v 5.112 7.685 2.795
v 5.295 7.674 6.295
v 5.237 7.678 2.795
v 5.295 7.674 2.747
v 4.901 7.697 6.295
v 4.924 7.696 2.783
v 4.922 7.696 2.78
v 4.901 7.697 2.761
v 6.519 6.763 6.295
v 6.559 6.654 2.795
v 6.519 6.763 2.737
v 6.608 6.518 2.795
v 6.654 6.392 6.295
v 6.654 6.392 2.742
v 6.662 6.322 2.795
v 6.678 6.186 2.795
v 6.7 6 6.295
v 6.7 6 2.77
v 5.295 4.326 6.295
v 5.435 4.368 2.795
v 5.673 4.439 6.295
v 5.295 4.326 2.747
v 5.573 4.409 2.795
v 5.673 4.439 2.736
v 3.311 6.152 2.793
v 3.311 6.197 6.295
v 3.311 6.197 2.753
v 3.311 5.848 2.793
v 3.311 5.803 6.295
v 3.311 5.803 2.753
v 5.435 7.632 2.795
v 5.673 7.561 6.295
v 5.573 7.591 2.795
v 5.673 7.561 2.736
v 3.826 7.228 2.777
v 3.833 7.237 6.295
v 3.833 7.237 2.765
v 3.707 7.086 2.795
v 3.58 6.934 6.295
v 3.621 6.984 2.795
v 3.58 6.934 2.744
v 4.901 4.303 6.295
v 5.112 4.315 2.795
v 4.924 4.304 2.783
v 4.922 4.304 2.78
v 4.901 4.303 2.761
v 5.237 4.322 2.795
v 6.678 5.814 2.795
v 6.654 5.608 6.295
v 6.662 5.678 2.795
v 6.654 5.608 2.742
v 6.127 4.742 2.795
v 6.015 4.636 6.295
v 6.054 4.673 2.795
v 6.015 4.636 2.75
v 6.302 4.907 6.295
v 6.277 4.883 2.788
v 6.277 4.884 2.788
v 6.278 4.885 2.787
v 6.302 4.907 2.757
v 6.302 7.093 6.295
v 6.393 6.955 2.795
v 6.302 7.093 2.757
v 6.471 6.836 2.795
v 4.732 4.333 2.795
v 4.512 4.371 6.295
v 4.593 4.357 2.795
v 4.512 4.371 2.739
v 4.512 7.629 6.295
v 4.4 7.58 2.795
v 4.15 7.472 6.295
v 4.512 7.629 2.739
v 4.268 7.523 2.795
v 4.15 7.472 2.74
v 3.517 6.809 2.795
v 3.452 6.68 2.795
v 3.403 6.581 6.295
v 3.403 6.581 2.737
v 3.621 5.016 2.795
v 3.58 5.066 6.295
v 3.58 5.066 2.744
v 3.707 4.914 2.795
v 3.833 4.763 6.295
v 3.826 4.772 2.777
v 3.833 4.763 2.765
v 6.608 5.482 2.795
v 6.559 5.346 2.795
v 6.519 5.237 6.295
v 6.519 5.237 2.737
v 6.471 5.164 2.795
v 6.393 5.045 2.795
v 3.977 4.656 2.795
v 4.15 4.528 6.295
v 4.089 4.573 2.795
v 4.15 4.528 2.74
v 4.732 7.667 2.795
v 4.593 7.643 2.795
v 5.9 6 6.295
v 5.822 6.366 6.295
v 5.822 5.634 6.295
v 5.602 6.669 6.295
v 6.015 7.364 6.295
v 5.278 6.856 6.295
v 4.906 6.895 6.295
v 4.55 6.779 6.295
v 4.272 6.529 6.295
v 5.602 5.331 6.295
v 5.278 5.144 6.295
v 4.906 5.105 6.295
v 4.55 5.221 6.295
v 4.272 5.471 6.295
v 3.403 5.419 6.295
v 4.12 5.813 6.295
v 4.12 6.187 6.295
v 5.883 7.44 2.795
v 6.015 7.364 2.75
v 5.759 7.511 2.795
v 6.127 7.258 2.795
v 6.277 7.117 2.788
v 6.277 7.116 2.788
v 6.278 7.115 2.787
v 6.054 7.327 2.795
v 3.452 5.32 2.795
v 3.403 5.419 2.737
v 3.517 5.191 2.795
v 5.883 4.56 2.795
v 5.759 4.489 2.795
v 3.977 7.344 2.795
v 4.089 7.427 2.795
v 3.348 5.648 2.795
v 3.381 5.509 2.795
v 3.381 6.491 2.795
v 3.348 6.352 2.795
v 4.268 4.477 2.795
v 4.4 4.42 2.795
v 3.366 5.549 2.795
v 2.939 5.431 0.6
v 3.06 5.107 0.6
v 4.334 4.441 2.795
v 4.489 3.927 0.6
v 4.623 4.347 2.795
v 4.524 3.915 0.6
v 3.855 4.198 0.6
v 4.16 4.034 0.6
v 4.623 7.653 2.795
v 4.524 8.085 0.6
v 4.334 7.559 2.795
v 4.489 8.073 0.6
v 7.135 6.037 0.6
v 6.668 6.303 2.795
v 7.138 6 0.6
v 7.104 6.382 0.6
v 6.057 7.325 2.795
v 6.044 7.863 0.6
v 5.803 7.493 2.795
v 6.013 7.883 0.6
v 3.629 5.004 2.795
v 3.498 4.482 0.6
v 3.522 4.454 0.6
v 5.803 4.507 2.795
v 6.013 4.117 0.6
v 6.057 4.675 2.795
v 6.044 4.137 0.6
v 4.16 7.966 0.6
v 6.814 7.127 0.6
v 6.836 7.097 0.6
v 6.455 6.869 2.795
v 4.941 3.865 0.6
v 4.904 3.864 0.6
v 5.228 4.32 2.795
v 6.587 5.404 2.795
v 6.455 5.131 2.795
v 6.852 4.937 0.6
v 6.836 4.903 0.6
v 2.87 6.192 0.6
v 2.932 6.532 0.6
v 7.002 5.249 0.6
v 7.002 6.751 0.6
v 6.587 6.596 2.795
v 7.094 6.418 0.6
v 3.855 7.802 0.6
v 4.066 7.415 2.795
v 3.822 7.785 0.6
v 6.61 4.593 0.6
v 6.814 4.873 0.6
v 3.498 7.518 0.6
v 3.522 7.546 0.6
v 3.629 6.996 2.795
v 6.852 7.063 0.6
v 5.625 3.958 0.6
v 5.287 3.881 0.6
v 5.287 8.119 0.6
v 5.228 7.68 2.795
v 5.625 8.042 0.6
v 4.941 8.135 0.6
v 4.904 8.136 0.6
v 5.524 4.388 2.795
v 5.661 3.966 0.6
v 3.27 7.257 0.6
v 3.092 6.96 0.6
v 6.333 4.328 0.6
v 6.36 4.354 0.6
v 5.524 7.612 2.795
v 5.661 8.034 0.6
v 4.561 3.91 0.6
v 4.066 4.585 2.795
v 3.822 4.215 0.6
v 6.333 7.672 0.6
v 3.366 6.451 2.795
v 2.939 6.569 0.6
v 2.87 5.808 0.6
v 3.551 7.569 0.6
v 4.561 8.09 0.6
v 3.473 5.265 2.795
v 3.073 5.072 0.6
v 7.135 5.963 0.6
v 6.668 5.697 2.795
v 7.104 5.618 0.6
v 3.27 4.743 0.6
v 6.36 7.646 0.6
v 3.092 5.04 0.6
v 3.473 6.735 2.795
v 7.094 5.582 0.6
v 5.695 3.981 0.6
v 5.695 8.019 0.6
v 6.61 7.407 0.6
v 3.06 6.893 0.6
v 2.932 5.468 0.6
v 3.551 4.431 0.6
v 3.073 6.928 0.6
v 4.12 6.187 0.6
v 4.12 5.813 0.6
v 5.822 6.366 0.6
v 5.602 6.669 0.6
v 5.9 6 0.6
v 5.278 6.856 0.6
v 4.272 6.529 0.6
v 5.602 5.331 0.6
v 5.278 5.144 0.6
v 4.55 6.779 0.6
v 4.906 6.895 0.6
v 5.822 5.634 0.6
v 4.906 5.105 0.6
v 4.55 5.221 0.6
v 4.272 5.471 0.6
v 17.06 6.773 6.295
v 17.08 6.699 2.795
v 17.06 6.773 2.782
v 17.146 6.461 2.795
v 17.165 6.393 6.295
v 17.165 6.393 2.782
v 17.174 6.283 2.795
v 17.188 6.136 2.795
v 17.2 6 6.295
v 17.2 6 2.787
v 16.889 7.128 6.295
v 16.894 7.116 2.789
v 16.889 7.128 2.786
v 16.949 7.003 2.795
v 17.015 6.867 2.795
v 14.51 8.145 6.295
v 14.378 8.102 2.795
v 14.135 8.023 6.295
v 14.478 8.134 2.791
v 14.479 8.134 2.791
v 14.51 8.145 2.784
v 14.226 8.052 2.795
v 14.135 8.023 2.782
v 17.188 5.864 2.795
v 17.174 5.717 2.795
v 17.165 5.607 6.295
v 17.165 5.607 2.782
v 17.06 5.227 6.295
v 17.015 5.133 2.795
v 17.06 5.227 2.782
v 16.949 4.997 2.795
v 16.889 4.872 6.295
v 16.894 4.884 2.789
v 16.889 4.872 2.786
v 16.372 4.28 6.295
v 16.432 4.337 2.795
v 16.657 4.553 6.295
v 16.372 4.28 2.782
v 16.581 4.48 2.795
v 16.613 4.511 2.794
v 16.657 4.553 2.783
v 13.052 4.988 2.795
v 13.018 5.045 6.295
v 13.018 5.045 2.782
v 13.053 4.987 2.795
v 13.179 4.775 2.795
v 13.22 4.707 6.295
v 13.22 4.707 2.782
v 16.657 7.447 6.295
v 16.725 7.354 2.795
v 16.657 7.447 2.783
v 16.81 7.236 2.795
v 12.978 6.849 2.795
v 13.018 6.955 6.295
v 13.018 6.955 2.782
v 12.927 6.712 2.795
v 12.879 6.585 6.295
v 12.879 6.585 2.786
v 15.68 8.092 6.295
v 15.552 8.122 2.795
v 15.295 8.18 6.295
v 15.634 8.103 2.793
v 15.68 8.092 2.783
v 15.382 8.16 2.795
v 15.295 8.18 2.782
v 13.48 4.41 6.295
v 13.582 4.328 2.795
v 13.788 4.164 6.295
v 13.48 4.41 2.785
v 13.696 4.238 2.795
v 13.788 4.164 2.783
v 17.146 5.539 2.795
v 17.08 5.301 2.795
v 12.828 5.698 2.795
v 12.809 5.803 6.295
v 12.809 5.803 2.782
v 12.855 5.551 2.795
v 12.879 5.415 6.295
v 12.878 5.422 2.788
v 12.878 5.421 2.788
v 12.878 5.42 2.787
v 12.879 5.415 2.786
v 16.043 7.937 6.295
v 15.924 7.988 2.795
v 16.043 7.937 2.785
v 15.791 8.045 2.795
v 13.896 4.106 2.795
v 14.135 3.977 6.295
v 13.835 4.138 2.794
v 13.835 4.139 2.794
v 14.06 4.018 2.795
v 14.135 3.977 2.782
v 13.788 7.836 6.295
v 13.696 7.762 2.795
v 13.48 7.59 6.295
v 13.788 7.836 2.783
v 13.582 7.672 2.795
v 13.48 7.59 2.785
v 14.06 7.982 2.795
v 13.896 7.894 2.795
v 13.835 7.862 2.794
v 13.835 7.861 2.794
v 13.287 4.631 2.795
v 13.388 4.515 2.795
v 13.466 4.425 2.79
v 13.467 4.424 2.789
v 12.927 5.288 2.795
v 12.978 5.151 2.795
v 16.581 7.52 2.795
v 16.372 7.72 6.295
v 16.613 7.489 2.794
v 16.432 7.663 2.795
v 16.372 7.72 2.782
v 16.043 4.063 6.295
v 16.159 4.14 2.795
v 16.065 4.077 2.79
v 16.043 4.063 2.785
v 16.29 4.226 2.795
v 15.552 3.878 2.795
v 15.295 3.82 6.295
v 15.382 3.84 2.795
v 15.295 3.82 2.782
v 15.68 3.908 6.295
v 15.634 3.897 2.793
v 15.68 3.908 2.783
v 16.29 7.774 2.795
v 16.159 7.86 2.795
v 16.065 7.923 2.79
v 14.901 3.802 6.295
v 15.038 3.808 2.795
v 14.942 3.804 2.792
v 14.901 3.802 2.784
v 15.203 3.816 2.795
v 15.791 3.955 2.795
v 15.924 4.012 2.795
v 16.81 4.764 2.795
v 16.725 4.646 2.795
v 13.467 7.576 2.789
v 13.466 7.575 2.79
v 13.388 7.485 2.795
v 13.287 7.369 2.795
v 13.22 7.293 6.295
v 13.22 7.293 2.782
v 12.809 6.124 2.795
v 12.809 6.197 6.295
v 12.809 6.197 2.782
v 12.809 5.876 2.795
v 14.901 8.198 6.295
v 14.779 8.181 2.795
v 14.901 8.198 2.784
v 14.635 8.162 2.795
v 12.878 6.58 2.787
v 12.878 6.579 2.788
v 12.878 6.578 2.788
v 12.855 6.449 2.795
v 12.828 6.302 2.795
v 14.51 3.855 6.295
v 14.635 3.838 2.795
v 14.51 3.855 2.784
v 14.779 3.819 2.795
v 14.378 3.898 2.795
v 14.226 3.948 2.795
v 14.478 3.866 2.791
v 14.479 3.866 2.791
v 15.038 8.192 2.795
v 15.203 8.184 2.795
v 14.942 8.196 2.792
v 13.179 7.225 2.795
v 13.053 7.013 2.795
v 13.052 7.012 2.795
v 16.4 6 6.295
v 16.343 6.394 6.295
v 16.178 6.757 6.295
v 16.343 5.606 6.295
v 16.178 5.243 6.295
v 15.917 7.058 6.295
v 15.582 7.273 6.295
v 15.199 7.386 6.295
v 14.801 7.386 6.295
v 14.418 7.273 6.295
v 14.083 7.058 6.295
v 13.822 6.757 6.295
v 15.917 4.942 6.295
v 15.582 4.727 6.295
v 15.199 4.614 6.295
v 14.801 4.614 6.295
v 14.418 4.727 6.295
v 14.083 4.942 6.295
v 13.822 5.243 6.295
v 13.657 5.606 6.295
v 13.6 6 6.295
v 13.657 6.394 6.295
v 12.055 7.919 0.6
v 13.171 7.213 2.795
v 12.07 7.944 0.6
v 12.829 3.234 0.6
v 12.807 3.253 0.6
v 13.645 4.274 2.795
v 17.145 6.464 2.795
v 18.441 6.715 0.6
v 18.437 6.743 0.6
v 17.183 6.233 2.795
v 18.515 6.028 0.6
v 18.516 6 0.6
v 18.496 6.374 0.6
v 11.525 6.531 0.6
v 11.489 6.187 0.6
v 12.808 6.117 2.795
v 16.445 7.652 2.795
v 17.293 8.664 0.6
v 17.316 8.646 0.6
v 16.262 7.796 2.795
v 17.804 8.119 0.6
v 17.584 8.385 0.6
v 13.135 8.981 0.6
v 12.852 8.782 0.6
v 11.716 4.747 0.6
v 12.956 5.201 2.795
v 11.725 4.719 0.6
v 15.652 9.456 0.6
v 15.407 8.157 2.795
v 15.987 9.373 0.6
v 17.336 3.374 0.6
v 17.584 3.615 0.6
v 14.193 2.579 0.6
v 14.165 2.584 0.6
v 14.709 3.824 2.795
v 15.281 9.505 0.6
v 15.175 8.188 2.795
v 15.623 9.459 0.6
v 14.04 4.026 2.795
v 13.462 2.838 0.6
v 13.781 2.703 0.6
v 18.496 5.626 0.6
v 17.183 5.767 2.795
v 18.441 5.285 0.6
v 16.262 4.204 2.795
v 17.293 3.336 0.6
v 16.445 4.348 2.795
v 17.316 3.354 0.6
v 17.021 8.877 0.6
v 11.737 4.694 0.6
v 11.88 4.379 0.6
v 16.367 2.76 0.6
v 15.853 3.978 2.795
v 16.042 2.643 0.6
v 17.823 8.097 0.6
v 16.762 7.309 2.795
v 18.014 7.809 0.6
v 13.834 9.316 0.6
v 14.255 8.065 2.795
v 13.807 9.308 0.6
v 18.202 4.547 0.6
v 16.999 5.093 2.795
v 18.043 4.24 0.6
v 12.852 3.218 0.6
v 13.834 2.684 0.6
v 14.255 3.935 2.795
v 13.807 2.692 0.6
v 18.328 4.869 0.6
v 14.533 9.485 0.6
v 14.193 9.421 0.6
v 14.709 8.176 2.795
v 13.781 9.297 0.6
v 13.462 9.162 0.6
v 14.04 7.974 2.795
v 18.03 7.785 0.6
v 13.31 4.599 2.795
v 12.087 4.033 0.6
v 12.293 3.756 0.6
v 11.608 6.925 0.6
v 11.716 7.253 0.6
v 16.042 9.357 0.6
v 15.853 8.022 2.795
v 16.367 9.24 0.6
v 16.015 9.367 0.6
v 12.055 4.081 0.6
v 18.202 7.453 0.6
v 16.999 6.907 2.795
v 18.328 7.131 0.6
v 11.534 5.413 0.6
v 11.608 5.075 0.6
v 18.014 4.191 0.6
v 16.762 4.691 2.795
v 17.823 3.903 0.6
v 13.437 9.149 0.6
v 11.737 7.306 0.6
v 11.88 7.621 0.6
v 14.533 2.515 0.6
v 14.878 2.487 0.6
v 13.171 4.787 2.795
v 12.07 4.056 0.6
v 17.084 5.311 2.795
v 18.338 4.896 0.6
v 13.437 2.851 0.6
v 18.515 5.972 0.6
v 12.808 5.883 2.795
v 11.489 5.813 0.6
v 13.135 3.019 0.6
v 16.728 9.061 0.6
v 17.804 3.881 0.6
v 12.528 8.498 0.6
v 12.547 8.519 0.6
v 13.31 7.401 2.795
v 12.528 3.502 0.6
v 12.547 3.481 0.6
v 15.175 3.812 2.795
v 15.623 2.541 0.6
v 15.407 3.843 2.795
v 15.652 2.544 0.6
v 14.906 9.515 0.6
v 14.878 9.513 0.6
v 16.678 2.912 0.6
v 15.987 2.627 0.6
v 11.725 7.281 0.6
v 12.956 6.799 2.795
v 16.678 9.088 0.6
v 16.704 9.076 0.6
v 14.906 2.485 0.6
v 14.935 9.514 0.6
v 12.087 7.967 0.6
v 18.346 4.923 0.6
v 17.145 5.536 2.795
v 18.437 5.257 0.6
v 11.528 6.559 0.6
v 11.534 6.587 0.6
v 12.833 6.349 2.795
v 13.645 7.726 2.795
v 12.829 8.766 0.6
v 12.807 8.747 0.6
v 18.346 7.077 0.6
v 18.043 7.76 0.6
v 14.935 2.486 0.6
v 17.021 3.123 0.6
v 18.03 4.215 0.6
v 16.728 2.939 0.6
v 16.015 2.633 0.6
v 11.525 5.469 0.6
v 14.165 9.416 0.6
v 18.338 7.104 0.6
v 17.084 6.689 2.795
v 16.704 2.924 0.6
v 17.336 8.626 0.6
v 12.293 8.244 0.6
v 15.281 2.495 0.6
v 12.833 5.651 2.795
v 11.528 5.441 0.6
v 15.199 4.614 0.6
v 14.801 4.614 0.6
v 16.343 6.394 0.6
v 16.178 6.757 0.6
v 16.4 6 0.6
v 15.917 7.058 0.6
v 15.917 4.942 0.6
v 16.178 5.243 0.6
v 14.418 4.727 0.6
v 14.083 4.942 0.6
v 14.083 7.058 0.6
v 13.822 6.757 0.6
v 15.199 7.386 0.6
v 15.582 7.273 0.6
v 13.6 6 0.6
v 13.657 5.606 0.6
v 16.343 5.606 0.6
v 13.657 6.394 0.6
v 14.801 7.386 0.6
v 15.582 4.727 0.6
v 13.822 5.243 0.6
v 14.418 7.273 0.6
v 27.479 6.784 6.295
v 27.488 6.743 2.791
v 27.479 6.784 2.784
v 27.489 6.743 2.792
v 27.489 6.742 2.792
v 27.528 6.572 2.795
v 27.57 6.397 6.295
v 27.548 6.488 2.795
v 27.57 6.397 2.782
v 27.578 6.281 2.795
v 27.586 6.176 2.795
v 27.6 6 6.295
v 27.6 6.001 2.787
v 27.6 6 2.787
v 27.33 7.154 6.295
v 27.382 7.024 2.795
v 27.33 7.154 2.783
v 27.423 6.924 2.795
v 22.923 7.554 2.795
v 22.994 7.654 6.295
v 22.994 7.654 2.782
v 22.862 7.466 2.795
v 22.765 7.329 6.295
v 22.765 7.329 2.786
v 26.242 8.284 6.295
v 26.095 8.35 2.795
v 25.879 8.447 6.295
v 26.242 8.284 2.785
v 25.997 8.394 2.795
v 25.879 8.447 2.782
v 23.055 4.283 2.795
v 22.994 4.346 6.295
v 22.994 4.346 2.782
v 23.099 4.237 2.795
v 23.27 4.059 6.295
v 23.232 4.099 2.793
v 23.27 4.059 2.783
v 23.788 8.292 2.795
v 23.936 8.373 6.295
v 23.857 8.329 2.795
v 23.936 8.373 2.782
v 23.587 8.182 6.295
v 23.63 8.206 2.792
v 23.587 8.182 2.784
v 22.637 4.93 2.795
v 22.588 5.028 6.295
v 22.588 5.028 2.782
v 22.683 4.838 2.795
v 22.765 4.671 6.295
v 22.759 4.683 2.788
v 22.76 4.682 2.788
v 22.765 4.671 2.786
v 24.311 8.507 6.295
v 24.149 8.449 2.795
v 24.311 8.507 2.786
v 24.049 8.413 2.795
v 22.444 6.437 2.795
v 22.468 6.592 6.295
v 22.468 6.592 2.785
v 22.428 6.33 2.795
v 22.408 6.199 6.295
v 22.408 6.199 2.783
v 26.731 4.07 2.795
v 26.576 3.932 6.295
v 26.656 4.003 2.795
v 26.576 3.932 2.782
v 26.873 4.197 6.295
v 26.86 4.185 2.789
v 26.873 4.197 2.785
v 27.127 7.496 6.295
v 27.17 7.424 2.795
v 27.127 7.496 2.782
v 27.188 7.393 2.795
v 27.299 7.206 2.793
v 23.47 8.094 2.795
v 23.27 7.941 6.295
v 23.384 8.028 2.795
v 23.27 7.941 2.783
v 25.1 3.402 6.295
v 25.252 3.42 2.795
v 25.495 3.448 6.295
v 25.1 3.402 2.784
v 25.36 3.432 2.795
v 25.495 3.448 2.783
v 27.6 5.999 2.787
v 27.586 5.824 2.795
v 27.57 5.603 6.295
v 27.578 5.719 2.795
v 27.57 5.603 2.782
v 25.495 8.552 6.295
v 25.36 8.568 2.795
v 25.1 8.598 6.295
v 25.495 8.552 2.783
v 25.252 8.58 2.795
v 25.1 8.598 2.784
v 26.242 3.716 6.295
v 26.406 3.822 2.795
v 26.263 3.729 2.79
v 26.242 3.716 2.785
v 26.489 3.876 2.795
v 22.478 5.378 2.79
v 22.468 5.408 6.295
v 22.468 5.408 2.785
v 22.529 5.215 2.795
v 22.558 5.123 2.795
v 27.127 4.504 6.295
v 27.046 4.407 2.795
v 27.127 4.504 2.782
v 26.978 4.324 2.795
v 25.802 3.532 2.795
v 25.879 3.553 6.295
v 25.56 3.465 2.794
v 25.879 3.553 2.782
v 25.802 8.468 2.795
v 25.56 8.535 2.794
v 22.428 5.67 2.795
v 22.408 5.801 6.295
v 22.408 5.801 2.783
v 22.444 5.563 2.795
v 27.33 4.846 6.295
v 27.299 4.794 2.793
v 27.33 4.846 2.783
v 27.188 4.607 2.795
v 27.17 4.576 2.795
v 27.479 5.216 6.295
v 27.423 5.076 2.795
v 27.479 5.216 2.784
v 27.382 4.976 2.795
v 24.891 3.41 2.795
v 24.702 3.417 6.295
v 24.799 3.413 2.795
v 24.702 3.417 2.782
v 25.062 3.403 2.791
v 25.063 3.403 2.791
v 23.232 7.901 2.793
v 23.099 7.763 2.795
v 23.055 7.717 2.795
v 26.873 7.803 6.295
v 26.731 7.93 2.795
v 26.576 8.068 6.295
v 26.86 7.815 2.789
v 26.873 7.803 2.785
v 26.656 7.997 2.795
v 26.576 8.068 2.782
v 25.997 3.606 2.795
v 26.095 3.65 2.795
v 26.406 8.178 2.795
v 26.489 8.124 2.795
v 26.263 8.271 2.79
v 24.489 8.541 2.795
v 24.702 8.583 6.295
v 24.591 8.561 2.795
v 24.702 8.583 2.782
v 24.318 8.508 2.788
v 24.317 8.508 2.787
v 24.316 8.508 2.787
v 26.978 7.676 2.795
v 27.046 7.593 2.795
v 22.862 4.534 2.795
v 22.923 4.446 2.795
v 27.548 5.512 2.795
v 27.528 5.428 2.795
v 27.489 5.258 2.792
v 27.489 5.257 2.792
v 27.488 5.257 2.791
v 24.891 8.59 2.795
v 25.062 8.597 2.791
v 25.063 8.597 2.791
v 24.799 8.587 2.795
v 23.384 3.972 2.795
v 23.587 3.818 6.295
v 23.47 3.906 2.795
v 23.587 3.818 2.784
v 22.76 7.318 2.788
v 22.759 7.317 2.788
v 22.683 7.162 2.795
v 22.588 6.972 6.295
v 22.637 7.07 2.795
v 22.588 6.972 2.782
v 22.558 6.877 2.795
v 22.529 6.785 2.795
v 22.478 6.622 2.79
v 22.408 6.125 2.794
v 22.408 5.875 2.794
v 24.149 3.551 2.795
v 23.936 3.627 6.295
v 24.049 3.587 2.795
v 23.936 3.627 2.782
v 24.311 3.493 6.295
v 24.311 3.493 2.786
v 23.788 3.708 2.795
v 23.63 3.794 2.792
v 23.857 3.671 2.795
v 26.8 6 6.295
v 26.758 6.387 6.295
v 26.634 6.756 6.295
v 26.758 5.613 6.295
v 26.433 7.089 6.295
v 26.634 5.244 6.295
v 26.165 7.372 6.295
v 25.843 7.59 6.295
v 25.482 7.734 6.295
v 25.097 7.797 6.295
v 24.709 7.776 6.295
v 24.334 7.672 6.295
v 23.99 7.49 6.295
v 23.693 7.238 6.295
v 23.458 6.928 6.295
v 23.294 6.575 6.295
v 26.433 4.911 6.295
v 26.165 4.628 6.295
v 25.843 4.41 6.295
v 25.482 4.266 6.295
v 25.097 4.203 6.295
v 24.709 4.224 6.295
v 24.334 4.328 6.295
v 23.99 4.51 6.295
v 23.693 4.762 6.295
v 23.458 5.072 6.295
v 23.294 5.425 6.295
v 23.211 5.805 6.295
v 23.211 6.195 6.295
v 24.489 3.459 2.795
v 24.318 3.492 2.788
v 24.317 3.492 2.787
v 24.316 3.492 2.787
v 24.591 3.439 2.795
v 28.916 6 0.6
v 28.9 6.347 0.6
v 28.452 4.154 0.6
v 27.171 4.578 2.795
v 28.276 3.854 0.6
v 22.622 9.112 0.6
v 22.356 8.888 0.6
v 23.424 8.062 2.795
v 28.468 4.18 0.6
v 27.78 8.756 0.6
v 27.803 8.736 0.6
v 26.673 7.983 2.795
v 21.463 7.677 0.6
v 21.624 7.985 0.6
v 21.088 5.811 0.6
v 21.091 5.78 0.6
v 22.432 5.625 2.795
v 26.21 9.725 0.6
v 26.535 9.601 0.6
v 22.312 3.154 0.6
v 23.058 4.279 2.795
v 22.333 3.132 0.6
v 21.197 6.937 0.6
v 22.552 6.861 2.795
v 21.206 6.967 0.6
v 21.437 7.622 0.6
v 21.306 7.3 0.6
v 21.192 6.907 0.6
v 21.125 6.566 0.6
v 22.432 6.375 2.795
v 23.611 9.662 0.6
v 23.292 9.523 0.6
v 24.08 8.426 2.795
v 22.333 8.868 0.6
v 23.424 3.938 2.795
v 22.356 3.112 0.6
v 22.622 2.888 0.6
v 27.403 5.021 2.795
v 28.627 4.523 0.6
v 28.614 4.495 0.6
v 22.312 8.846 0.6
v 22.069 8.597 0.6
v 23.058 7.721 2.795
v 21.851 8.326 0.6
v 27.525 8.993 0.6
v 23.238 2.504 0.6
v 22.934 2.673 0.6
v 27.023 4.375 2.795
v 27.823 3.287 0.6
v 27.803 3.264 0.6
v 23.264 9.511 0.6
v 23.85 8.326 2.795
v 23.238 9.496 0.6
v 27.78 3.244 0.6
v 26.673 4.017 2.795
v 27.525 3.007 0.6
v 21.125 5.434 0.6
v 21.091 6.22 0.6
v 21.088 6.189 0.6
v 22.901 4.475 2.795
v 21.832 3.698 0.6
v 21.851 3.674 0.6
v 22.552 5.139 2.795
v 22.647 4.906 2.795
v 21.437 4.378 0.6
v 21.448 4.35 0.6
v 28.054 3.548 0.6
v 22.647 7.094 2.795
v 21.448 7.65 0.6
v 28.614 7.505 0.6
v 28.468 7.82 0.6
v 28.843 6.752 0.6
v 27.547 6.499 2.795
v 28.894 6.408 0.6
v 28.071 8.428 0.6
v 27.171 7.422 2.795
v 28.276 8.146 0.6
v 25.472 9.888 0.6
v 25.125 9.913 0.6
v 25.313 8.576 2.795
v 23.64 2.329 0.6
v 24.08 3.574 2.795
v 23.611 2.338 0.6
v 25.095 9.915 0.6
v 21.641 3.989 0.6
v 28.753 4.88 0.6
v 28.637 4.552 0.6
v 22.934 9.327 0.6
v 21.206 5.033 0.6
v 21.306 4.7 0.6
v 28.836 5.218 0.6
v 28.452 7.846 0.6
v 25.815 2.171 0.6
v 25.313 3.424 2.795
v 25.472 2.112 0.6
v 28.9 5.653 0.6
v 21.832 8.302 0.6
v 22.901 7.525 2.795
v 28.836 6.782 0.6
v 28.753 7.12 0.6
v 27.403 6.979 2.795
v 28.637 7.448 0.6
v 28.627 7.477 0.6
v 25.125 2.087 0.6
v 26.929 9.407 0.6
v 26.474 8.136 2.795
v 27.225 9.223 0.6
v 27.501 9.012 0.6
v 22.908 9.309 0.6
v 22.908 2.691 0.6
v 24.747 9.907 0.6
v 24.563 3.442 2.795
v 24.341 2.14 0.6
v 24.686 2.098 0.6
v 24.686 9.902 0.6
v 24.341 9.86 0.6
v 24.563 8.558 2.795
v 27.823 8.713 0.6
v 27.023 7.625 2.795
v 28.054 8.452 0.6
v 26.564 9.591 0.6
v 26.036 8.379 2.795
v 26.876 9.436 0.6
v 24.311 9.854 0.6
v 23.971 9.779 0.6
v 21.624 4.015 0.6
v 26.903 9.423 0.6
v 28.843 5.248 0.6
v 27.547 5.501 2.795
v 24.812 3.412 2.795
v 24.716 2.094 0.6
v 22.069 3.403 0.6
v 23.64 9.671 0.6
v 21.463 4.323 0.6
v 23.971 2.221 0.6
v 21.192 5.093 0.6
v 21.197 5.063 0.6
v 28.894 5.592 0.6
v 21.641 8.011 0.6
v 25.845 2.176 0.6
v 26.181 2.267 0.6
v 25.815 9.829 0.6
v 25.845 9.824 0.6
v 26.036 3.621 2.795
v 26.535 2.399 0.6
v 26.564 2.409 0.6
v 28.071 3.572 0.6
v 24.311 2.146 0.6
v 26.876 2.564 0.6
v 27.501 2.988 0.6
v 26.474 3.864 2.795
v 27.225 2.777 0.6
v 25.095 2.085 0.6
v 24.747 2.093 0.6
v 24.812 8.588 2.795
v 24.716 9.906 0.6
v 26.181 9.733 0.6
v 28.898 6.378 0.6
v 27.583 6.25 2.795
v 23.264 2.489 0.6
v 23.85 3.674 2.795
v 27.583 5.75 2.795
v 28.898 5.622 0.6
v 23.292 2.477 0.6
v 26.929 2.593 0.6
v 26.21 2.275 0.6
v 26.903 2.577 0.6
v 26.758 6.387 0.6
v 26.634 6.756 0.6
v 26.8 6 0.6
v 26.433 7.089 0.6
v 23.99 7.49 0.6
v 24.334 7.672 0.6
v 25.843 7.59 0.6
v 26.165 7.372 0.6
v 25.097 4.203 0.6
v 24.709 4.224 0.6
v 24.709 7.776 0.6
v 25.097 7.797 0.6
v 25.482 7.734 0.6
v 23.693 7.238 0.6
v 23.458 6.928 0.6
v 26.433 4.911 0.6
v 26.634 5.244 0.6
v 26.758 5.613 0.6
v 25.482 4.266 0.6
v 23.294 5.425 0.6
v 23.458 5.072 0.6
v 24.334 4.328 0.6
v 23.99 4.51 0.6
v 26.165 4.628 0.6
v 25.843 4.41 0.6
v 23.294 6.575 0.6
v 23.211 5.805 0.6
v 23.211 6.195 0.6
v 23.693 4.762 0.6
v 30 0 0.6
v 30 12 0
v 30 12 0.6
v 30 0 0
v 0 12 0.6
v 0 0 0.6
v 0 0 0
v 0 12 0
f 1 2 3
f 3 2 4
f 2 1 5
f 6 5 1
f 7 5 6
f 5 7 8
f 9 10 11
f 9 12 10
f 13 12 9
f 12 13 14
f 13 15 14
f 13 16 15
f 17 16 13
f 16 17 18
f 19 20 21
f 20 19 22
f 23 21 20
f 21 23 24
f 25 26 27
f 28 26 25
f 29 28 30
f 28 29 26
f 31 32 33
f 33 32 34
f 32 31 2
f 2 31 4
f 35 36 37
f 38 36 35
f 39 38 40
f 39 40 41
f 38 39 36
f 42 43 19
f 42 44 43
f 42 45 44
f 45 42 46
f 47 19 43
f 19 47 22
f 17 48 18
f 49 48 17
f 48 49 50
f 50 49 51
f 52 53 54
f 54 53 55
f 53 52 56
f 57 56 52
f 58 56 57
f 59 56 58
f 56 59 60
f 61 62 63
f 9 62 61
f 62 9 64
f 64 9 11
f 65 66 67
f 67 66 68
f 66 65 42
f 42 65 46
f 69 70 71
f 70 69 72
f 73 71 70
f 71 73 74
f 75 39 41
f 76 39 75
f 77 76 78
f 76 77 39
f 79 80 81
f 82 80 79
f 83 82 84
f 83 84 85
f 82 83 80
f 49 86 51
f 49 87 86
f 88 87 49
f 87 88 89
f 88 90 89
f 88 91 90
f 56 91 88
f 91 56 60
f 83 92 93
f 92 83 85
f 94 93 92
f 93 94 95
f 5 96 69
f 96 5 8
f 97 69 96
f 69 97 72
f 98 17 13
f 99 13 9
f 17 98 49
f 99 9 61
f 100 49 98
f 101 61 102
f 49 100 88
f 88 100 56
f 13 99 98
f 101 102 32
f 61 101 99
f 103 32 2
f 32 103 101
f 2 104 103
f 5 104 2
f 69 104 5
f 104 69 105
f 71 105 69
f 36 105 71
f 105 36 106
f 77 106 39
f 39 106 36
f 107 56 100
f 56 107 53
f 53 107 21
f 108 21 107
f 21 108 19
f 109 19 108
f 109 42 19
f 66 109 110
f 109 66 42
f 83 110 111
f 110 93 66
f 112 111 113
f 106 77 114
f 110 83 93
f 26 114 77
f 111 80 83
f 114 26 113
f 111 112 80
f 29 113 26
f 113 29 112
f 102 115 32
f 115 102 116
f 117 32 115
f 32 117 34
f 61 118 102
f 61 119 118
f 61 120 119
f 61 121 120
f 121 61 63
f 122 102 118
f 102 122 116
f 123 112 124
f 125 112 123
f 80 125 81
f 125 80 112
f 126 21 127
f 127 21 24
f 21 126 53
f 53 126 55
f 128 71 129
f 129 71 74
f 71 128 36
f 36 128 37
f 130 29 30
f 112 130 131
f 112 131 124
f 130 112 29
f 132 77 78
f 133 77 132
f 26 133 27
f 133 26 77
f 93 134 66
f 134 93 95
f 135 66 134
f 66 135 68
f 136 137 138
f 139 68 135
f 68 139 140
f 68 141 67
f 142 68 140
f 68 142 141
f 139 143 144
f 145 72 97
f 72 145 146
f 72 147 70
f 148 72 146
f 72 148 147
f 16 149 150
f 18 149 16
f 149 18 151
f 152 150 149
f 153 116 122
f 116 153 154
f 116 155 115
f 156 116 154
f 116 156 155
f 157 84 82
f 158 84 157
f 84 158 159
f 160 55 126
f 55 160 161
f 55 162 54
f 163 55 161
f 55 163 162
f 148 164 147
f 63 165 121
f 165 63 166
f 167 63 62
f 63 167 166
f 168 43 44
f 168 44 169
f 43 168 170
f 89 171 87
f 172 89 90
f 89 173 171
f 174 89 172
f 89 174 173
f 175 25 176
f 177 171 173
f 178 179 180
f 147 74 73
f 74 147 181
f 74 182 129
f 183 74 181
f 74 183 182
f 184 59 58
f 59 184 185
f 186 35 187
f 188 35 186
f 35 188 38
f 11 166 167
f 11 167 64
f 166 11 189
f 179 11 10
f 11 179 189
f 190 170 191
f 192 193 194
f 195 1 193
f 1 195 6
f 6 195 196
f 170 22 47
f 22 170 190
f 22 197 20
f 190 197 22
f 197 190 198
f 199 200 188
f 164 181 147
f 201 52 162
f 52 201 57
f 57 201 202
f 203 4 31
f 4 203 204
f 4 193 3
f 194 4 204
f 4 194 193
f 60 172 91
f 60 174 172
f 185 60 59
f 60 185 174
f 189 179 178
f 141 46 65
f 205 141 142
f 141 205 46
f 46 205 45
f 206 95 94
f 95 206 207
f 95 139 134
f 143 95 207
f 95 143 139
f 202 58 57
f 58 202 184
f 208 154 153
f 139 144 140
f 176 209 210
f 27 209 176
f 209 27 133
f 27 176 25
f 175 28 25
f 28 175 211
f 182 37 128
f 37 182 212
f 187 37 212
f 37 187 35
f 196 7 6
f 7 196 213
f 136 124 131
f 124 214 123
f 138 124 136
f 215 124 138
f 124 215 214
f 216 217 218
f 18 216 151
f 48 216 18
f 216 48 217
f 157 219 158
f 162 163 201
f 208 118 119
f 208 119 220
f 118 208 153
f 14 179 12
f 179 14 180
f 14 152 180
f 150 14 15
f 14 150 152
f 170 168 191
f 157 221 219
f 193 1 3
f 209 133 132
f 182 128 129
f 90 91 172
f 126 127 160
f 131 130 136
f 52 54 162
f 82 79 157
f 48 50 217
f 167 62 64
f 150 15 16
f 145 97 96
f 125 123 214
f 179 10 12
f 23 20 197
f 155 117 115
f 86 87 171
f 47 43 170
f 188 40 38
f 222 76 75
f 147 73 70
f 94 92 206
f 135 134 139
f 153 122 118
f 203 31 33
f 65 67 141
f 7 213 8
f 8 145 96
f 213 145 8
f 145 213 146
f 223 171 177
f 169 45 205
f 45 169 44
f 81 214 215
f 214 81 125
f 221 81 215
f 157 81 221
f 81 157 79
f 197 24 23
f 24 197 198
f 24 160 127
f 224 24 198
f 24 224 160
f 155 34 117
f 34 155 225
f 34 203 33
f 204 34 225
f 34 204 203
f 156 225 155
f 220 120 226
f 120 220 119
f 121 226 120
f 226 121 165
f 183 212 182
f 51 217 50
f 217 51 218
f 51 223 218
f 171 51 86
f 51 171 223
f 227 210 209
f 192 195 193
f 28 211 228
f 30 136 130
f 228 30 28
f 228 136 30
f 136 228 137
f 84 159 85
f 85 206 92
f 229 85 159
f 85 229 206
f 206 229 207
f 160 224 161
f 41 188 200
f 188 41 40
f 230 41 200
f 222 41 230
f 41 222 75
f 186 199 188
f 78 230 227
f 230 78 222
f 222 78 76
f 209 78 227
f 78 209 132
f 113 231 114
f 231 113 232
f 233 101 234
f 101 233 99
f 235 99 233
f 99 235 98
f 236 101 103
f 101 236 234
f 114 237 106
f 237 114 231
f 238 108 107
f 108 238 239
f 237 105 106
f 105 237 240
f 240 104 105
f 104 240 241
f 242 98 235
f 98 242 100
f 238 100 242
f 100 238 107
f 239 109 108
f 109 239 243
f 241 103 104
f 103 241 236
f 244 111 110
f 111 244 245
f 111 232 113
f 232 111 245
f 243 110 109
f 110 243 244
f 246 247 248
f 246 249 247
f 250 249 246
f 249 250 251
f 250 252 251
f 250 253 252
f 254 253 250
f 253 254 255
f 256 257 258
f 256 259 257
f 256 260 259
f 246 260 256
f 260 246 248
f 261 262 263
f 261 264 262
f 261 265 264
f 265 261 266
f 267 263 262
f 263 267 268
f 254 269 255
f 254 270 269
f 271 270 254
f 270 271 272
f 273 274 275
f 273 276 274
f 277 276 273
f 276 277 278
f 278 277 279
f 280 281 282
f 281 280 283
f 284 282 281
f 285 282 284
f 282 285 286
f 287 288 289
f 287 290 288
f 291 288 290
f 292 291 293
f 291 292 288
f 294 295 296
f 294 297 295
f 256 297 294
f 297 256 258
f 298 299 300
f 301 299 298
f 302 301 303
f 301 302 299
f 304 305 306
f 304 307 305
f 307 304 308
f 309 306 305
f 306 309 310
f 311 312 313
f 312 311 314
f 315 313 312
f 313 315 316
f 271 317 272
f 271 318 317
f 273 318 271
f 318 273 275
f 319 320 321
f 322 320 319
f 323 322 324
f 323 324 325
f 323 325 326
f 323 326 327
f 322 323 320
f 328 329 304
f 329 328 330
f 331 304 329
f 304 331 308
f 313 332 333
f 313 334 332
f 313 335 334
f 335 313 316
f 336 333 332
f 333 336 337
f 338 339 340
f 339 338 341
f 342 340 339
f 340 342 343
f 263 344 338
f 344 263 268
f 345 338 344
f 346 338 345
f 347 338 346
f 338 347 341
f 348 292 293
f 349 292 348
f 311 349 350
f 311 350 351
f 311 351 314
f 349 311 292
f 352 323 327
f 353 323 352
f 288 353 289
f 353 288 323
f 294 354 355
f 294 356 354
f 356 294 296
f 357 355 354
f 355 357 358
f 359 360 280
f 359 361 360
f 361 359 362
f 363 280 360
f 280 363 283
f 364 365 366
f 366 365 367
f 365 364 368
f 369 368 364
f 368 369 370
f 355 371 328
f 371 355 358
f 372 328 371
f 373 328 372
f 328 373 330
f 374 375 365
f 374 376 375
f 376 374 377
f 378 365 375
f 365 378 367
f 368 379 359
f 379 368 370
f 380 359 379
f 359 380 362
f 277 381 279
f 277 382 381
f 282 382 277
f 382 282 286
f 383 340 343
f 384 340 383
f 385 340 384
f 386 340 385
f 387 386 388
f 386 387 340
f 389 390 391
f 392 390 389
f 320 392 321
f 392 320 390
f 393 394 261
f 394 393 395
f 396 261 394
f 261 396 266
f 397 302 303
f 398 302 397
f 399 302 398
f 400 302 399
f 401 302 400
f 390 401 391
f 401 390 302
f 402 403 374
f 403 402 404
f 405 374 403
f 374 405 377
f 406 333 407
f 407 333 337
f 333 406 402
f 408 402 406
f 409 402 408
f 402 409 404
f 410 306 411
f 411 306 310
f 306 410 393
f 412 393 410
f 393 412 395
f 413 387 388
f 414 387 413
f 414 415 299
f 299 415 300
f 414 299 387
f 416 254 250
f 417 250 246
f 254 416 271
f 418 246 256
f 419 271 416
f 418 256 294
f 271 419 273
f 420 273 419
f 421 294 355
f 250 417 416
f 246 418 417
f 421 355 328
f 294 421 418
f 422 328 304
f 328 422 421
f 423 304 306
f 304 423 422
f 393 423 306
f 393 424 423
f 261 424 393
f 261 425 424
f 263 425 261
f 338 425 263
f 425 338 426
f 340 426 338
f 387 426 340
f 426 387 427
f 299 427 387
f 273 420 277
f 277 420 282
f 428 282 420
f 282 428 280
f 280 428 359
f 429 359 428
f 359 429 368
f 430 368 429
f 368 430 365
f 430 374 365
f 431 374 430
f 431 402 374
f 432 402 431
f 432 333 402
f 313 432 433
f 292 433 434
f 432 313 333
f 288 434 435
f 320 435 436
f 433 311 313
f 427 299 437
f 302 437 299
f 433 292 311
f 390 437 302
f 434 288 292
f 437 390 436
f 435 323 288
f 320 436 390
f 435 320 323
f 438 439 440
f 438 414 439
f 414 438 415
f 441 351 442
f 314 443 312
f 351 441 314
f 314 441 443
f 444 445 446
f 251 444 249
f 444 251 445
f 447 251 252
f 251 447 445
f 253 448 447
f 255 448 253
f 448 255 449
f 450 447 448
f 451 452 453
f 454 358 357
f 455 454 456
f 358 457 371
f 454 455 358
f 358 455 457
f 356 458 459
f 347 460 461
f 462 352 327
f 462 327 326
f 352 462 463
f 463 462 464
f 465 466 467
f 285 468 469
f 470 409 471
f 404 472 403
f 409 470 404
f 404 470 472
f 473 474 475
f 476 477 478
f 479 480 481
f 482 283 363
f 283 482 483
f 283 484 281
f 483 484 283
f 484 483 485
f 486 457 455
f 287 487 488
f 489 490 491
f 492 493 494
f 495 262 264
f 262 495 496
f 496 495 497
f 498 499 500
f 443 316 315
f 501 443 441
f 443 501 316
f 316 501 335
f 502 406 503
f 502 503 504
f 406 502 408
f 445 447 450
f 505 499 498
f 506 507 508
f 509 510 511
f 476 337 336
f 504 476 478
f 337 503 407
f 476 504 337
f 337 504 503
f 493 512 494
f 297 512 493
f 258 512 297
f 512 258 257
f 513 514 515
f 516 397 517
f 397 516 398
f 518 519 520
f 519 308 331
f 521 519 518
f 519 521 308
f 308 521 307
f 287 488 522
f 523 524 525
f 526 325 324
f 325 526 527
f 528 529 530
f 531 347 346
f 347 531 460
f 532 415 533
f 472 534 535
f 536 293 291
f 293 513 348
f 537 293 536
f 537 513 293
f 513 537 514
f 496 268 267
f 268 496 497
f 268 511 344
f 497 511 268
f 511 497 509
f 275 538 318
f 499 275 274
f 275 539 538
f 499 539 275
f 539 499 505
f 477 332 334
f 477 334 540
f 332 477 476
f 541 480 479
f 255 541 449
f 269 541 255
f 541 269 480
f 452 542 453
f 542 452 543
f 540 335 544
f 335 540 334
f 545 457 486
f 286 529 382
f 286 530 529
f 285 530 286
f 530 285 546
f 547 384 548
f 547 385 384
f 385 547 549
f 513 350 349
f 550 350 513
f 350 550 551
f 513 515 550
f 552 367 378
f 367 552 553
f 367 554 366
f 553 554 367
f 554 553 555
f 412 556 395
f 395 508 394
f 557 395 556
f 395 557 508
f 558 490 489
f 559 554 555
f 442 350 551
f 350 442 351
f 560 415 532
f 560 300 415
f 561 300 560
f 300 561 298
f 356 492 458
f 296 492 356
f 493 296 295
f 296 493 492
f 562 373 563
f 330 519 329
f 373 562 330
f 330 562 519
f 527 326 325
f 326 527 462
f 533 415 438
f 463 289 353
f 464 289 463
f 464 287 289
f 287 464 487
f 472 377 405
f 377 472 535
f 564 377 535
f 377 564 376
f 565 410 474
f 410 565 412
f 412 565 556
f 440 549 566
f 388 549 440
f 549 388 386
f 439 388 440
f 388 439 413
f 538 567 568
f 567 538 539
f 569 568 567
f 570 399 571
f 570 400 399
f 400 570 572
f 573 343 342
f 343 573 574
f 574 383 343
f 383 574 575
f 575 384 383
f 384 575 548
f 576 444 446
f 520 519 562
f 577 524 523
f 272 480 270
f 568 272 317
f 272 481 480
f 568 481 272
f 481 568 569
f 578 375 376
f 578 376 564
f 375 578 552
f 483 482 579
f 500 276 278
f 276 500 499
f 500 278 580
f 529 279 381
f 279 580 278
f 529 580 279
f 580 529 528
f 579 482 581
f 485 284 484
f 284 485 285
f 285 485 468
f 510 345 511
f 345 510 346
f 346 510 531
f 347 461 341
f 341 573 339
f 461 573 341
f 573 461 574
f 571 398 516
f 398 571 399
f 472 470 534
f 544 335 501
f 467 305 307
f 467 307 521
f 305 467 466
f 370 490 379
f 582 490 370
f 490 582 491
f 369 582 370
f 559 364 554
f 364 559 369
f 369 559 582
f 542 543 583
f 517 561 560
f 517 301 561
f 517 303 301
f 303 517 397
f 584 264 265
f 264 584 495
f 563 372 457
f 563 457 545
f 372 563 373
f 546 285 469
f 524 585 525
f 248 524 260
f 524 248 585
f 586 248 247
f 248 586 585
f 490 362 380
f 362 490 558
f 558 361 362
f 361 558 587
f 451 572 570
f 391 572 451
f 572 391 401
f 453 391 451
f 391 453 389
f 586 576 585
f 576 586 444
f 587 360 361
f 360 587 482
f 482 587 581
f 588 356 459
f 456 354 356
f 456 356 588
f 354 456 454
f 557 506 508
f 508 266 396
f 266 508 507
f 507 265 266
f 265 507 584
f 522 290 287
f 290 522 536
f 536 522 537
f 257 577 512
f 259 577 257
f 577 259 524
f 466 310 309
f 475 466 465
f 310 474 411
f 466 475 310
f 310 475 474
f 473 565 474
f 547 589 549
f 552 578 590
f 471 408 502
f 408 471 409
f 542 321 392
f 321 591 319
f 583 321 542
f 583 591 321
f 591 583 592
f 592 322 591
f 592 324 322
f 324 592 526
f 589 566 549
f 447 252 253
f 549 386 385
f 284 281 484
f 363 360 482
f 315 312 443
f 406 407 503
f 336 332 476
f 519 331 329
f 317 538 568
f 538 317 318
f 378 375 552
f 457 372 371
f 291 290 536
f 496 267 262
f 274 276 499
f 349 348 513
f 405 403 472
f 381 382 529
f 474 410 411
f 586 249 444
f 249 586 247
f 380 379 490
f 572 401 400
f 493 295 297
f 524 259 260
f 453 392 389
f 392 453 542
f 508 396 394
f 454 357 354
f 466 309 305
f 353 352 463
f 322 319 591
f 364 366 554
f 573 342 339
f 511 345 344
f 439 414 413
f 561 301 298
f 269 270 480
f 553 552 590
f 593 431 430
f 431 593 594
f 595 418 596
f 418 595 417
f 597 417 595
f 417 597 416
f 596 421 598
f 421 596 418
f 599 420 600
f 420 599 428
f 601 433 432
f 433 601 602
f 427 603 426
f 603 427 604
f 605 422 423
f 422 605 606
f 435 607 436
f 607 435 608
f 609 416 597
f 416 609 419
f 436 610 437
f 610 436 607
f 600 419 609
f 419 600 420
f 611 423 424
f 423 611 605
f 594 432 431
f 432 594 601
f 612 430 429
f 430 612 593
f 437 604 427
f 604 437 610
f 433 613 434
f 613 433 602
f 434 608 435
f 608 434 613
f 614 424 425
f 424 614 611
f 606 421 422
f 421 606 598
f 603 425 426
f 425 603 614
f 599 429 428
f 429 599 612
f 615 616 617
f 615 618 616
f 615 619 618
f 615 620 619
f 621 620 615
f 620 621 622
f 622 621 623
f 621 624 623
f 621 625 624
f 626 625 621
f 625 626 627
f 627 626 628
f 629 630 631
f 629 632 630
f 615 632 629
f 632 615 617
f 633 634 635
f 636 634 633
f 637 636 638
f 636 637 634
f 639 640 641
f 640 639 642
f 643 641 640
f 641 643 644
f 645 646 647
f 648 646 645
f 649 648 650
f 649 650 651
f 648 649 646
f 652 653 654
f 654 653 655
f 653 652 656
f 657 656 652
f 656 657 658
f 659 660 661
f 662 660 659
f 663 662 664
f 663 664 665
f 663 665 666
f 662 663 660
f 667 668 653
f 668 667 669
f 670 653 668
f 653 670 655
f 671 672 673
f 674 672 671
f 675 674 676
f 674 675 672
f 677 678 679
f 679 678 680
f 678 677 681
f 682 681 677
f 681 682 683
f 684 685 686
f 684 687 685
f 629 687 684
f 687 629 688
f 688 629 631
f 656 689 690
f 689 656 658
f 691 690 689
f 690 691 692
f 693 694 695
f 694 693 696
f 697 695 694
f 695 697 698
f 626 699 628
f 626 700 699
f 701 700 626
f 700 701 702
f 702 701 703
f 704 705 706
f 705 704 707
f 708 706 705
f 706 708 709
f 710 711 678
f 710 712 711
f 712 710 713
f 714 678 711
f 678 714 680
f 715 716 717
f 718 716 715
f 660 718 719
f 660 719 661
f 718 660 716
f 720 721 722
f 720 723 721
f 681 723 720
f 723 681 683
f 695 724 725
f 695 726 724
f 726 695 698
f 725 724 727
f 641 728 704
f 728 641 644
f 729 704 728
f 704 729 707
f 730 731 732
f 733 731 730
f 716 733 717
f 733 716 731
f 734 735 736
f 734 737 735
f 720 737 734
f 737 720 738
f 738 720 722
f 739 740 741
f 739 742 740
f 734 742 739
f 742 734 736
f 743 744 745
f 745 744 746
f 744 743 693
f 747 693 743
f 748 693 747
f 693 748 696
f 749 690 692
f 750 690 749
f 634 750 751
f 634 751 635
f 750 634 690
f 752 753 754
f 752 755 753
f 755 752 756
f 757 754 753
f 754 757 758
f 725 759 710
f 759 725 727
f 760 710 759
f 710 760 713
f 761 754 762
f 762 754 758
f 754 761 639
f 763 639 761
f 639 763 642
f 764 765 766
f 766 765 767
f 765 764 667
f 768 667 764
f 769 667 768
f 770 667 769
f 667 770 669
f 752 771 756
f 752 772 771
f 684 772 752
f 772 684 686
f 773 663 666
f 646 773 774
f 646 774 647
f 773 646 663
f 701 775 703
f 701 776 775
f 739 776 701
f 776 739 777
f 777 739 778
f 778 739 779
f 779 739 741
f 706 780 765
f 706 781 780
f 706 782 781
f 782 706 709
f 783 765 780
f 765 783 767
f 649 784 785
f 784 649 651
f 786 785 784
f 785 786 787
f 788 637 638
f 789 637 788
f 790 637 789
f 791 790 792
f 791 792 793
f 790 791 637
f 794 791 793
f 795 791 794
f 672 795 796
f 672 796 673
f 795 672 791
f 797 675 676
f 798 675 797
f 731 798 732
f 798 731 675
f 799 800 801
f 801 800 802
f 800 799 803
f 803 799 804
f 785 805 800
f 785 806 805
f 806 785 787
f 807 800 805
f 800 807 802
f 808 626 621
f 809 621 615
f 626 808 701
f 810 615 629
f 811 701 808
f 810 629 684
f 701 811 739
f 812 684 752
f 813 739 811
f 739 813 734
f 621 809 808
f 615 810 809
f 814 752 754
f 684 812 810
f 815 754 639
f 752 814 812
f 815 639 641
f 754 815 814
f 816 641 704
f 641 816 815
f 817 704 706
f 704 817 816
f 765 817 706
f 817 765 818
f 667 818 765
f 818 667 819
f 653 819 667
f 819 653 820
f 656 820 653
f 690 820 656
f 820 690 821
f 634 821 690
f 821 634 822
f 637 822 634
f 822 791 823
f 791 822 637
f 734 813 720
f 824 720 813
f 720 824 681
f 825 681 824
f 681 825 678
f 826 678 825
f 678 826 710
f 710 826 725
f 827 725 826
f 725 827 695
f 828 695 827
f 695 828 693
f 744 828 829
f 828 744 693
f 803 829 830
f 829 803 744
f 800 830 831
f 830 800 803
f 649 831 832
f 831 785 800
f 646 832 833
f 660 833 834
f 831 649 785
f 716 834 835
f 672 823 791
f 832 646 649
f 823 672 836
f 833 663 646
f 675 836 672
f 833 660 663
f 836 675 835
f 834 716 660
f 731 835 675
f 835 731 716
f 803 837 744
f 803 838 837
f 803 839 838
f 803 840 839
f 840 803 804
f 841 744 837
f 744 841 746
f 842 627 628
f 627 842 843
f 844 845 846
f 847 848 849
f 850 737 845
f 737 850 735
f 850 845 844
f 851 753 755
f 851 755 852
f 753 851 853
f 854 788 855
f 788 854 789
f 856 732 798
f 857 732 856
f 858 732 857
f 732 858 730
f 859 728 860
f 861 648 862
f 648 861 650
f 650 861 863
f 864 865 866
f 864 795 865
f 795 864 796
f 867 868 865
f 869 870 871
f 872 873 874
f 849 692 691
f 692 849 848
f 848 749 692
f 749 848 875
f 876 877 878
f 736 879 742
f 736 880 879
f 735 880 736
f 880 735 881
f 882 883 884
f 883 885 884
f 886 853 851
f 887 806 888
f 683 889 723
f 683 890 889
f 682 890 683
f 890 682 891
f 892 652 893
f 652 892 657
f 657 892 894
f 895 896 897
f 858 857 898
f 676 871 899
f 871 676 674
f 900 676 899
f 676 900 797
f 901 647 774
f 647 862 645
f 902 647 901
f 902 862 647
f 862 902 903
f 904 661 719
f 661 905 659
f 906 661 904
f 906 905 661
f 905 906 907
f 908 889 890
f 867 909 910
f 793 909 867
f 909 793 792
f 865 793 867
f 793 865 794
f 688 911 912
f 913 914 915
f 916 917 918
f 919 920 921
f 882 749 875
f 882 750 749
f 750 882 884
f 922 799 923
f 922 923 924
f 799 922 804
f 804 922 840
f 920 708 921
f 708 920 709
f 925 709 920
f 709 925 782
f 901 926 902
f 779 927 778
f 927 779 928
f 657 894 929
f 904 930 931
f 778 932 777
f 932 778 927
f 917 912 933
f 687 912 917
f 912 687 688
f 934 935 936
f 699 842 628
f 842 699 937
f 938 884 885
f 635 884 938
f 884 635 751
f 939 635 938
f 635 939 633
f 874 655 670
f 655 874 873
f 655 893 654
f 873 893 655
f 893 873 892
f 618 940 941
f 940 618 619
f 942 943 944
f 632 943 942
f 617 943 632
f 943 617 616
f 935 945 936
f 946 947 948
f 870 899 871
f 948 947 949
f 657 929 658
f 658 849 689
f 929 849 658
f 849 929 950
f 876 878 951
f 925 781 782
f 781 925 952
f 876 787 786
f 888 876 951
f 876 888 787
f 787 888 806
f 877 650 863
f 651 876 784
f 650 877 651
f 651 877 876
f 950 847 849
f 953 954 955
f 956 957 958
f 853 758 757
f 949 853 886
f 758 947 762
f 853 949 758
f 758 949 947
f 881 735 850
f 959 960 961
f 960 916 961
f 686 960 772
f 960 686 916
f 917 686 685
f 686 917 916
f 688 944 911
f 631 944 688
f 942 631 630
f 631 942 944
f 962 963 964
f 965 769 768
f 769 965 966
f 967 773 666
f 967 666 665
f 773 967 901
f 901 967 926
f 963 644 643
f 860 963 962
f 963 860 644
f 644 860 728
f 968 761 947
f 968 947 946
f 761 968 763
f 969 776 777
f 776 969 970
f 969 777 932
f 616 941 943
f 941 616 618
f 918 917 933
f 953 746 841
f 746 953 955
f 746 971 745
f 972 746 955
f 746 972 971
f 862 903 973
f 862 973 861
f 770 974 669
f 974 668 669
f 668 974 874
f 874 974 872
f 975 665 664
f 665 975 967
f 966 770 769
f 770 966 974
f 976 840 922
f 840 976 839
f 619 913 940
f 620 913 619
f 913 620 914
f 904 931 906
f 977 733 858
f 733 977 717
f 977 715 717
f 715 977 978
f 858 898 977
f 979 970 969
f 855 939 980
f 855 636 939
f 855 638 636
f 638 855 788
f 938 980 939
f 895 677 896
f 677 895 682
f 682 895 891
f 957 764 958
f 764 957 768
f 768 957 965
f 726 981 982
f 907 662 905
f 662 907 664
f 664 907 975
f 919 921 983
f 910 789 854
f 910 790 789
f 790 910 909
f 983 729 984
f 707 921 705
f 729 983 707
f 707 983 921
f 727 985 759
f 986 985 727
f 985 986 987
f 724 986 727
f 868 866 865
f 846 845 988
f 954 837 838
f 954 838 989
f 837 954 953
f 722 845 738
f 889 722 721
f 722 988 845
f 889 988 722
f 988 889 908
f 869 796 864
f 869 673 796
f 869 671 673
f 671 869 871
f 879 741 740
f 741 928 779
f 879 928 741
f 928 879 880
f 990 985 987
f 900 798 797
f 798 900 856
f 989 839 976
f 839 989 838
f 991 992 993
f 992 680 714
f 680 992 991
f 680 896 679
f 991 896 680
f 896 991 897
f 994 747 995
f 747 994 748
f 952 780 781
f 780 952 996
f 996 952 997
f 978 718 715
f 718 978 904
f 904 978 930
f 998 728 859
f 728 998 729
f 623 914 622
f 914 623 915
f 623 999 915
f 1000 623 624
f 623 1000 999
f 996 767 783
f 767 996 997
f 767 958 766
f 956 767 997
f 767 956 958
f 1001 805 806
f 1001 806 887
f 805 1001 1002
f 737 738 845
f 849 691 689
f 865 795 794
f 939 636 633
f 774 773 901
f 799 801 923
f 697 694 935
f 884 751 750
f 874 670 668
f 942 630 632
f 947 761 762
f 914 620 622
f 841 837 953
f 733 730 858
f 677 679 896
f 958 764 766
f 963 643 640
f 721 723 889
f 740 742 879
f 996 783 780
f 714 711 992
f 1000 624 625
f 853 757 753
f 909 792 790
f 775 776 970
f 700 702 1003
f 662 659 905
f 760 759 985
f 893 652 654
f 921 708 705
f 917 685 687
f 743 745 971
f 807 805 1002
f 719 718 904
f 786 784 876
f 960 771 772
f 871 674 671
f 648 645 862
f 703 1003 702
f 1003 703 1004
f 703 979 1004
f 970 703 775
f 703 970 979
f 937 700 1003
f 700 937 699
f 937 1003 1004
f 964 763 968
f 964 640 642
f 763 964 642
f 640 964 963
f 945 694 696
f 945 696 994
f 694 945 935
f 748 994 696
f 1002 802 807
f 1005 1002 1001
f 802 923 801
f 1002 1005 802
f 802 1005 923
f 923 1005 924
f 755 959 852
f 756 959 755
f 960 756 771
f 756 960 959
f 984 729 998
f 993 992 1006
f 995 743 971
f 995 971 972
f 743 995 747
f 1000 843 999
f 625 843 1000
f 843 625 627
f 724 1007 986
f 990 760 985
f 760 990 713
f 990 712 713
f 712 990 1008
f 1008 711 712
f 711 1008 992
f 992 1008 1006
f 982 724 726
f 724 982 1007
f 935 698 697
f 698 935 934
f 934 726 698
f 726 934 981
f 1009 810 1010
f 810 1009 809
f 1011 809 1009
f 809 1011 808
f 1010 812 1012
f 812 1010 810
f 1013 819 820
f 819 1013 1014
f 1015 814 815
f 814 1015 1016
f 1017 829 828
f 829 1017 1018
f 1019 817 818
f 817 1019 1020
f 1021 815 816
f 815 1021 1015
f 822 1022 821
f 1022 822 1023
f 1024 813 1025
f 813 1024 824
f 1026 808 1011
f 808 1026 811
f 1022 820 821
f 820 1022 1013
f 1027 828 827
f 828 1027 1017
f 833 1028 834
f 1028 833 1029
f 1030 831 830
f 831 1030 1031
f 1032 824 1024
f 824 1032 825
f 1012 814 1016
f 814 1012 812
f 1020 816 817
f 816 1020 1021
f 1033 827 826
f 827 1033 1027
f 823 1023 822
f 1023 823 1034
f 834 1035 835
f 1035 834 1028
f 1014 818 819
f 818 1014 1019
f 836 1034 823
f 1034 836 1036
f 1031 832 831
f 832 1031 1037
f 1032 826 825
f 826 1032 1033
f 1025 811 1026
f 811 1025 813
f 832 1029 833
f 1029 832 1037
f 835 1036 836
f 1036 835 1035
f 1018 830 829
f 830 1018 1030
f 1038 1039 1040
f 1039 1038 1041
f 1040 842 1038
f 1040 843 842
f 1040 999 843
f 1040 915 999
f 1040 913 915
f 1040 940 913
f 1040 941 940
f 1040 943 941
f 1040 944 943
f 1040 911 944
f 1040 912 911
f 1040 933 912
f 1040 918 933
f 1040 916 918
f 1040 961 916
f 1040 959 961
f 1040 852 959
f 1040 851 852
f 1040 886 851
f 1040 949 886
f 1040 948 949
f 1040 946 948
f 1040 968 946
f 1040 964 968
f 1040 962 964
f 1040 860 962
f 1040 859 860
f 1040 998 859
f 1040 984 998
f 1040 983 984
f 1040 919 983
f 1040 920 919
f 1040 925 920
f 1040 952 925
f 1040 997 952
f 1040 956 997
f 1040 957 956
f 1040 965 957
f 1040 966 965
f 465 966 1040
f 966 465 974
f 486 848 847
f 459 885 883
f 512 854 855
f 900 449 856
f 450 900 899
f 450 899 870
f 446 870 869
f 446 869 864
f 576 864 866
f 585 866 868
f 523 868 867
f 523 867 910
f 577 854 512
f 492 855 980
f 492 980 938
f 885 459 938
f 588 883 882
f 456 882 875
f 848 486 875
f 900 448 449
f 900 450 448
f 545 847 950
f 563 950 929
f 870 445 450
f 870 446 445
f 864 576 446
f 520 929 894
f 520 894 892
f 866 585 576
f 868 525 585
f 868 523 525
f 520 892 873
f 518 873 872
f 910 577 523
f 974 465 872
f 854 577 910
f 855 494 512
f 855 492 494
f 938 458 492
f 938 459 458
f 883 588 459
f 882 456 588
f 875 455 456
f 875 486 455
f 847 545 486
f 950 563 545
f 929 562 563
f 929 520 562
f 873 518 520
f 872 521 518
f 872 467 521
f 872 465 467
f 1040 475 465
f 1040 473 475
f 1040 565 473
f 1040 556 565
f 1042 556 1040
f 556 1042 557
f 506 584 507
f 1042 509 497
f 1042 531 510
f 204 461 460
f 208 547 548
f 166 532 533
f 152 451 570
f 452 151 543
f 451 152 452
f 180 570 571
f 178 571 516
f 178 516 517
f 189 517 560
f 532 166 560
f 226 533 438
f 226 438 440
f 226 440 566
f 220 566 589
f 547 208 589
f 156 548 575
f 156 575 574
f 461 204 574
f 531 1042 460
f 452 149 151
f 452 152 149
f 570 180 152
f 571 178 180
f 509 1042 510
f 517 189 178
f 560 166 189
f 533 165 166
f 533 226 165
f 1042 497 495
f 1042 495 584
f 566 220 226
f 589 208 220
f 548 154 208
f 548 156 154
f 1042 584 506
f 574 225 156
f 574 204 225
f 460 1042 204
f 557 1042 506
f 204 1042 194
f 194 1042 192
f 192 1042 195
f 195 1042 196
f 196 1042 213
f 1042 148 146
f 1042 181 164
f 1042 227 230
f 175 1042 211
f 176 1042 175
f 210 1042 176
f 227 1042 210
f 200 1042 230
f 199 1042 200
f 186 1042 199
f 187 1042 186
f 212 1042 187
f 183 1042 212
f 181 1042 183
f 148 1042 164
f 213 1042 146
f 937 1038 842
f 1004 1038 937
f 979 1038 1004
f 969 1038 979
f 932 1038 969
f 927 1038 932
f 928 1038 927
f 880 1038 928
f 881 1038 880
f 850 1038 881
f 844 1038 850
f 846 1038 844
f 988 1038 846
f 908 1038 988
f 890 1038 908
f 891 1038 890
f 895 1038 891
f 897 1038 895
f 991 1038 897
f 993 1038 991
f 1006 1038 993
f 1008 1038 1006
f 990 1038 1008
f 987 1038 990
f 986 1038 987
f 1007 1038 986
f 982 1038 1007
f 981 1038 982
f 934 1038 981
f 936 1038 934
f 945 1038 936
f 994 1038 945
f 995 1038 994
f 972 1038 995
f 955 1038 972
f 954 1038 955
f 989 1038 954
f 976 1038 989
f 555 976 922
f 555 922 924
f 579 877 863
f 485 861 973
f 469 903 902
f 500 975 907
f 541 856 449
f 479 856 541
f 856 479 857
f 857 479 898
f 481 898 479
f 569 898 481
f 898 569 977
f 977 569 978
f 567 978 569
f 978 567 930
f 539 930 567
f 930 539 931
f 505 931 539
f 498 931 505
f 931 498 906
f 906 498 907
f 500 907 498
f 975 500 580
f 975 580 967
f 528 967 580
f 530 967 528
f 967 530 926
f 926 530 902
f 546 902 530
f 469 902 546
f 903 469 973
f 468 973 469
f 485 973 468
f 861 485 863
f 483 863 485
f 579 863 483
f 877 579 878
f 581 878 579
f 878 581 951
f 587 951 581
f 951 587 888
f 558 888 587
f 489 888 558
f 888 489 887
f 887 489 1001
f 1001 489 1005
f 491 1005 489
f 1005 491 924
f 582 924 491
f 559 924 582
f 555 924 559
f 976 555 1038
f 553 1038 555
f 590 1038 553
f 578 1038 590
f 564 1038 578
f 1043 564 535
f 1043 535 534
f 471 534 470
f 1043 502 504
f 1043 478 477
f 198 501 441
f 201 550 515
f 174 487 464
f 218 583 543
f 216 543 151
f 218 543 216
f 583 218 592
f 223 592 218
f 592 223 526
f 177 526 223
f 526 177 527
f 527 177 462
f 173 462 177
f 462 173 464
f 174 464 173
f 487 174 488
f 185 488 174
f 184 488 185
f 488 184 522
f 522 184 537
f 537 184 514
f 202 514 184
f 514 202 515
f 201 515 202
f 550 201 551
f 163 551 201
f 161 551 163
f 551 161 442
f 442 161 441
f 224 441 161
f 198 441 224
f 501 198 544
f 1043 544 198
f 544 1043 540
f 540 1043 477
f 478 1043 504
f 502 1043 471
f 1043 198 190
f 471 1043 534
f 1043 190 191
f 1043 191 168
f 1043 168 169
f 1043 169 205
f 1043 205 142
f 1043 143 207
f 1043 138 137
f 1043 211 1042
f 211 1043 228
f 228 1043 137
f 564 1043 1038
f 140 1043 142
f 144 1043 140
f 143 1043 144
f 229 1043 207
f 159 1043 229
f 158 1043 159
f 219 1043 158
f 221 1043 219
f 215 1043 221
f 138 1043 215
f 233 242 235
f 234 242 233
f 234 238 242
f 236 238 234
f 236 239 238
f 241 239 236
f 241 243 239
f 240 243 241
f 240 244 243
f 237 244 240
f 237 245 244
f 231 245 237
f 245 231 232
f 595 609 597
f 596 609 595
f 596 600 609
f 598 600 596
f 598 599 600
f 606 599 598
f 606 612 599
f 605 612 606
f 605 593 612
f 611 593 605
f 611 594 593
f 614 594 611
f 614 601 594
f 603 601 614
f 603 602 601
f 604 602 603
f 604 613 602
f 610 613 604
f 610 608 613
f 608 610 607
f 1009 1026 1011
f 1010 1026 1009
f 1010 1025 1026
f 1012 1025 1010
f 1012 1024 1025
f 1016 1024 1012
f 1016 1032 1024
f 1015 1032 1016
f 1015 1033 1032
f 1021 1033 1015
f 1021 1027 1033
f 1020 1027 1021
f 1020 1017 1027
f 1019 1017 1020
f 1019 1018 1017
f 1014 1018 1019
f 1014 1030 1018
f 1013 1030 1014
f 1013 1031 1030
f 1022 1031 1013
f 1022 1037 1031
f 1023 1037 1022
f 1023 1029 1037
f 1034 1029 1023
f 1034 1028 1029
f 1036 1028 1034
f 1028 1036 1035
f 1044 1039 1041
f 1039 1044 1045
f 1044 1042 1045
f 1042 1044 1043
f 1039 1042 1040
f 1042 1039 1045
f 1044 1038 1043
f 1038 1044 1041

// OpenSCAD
$fa=1;
$fs=0.4;
overlap=0.005;

module standoff(height, inner_r, outer_r, fillet_x, fillet_y, depth=-0.8) {
    d=depth <= 0 ? height+depth : depth;
    difference() {
        union() {
            cylinder(h=height, r=outer_r, center=false);
            cylinder(h=fillet_y, r1=fillet_x, r2=outer_r-overlap, center=false);
        }
        translate([0, 0, height-d]) cylinder(h=d+overlap, r=inner_r, center=false);
    }
}

module standoff_m2(height, inner_r_offset=0, outer_r=1.7, fillet_x=2.2, fillet_y=2.5, depth=0) {
    standoff(height, inner_r=0.9+inner_r_offset, outer_r=outer_r, fillet_x=fillet_x, fillet_y=fillet_y, depth=depth);
}

module standoff_m3(height, inner_r_offset=0, outer_r=2.2, fillet_x=3.7, fillet_y=2.5, depth=0) {
    standoff(height, inner_r=1.4+inner_r_offset, outer_r=outer_r, fillet_x=fillet_x, fillet_y=fillet_y, depth=depth);
}

module standoff_m4(height, inner_r_offset=0, outer_r=2.6, fillet_x=4.1, fillet_y=2.5, depth=0) {
    standoff(height, inner_r=1.8+inner_r_offset, outer_r=outer_r, fillet_x=fillet_x, fillet_y=fillet_y, depth=depth);
}

union() {
    cube([30, 12, 0.6]);
    translate([5, 6, 0.3-overlap])
        standoff_m2(6.0);
    translate([15, 6, 0.3-overlap])
        standoff_m3(6.0);
    translate([25, 6, 0.3-overlap])
        standoff_m4(6.0);
}
